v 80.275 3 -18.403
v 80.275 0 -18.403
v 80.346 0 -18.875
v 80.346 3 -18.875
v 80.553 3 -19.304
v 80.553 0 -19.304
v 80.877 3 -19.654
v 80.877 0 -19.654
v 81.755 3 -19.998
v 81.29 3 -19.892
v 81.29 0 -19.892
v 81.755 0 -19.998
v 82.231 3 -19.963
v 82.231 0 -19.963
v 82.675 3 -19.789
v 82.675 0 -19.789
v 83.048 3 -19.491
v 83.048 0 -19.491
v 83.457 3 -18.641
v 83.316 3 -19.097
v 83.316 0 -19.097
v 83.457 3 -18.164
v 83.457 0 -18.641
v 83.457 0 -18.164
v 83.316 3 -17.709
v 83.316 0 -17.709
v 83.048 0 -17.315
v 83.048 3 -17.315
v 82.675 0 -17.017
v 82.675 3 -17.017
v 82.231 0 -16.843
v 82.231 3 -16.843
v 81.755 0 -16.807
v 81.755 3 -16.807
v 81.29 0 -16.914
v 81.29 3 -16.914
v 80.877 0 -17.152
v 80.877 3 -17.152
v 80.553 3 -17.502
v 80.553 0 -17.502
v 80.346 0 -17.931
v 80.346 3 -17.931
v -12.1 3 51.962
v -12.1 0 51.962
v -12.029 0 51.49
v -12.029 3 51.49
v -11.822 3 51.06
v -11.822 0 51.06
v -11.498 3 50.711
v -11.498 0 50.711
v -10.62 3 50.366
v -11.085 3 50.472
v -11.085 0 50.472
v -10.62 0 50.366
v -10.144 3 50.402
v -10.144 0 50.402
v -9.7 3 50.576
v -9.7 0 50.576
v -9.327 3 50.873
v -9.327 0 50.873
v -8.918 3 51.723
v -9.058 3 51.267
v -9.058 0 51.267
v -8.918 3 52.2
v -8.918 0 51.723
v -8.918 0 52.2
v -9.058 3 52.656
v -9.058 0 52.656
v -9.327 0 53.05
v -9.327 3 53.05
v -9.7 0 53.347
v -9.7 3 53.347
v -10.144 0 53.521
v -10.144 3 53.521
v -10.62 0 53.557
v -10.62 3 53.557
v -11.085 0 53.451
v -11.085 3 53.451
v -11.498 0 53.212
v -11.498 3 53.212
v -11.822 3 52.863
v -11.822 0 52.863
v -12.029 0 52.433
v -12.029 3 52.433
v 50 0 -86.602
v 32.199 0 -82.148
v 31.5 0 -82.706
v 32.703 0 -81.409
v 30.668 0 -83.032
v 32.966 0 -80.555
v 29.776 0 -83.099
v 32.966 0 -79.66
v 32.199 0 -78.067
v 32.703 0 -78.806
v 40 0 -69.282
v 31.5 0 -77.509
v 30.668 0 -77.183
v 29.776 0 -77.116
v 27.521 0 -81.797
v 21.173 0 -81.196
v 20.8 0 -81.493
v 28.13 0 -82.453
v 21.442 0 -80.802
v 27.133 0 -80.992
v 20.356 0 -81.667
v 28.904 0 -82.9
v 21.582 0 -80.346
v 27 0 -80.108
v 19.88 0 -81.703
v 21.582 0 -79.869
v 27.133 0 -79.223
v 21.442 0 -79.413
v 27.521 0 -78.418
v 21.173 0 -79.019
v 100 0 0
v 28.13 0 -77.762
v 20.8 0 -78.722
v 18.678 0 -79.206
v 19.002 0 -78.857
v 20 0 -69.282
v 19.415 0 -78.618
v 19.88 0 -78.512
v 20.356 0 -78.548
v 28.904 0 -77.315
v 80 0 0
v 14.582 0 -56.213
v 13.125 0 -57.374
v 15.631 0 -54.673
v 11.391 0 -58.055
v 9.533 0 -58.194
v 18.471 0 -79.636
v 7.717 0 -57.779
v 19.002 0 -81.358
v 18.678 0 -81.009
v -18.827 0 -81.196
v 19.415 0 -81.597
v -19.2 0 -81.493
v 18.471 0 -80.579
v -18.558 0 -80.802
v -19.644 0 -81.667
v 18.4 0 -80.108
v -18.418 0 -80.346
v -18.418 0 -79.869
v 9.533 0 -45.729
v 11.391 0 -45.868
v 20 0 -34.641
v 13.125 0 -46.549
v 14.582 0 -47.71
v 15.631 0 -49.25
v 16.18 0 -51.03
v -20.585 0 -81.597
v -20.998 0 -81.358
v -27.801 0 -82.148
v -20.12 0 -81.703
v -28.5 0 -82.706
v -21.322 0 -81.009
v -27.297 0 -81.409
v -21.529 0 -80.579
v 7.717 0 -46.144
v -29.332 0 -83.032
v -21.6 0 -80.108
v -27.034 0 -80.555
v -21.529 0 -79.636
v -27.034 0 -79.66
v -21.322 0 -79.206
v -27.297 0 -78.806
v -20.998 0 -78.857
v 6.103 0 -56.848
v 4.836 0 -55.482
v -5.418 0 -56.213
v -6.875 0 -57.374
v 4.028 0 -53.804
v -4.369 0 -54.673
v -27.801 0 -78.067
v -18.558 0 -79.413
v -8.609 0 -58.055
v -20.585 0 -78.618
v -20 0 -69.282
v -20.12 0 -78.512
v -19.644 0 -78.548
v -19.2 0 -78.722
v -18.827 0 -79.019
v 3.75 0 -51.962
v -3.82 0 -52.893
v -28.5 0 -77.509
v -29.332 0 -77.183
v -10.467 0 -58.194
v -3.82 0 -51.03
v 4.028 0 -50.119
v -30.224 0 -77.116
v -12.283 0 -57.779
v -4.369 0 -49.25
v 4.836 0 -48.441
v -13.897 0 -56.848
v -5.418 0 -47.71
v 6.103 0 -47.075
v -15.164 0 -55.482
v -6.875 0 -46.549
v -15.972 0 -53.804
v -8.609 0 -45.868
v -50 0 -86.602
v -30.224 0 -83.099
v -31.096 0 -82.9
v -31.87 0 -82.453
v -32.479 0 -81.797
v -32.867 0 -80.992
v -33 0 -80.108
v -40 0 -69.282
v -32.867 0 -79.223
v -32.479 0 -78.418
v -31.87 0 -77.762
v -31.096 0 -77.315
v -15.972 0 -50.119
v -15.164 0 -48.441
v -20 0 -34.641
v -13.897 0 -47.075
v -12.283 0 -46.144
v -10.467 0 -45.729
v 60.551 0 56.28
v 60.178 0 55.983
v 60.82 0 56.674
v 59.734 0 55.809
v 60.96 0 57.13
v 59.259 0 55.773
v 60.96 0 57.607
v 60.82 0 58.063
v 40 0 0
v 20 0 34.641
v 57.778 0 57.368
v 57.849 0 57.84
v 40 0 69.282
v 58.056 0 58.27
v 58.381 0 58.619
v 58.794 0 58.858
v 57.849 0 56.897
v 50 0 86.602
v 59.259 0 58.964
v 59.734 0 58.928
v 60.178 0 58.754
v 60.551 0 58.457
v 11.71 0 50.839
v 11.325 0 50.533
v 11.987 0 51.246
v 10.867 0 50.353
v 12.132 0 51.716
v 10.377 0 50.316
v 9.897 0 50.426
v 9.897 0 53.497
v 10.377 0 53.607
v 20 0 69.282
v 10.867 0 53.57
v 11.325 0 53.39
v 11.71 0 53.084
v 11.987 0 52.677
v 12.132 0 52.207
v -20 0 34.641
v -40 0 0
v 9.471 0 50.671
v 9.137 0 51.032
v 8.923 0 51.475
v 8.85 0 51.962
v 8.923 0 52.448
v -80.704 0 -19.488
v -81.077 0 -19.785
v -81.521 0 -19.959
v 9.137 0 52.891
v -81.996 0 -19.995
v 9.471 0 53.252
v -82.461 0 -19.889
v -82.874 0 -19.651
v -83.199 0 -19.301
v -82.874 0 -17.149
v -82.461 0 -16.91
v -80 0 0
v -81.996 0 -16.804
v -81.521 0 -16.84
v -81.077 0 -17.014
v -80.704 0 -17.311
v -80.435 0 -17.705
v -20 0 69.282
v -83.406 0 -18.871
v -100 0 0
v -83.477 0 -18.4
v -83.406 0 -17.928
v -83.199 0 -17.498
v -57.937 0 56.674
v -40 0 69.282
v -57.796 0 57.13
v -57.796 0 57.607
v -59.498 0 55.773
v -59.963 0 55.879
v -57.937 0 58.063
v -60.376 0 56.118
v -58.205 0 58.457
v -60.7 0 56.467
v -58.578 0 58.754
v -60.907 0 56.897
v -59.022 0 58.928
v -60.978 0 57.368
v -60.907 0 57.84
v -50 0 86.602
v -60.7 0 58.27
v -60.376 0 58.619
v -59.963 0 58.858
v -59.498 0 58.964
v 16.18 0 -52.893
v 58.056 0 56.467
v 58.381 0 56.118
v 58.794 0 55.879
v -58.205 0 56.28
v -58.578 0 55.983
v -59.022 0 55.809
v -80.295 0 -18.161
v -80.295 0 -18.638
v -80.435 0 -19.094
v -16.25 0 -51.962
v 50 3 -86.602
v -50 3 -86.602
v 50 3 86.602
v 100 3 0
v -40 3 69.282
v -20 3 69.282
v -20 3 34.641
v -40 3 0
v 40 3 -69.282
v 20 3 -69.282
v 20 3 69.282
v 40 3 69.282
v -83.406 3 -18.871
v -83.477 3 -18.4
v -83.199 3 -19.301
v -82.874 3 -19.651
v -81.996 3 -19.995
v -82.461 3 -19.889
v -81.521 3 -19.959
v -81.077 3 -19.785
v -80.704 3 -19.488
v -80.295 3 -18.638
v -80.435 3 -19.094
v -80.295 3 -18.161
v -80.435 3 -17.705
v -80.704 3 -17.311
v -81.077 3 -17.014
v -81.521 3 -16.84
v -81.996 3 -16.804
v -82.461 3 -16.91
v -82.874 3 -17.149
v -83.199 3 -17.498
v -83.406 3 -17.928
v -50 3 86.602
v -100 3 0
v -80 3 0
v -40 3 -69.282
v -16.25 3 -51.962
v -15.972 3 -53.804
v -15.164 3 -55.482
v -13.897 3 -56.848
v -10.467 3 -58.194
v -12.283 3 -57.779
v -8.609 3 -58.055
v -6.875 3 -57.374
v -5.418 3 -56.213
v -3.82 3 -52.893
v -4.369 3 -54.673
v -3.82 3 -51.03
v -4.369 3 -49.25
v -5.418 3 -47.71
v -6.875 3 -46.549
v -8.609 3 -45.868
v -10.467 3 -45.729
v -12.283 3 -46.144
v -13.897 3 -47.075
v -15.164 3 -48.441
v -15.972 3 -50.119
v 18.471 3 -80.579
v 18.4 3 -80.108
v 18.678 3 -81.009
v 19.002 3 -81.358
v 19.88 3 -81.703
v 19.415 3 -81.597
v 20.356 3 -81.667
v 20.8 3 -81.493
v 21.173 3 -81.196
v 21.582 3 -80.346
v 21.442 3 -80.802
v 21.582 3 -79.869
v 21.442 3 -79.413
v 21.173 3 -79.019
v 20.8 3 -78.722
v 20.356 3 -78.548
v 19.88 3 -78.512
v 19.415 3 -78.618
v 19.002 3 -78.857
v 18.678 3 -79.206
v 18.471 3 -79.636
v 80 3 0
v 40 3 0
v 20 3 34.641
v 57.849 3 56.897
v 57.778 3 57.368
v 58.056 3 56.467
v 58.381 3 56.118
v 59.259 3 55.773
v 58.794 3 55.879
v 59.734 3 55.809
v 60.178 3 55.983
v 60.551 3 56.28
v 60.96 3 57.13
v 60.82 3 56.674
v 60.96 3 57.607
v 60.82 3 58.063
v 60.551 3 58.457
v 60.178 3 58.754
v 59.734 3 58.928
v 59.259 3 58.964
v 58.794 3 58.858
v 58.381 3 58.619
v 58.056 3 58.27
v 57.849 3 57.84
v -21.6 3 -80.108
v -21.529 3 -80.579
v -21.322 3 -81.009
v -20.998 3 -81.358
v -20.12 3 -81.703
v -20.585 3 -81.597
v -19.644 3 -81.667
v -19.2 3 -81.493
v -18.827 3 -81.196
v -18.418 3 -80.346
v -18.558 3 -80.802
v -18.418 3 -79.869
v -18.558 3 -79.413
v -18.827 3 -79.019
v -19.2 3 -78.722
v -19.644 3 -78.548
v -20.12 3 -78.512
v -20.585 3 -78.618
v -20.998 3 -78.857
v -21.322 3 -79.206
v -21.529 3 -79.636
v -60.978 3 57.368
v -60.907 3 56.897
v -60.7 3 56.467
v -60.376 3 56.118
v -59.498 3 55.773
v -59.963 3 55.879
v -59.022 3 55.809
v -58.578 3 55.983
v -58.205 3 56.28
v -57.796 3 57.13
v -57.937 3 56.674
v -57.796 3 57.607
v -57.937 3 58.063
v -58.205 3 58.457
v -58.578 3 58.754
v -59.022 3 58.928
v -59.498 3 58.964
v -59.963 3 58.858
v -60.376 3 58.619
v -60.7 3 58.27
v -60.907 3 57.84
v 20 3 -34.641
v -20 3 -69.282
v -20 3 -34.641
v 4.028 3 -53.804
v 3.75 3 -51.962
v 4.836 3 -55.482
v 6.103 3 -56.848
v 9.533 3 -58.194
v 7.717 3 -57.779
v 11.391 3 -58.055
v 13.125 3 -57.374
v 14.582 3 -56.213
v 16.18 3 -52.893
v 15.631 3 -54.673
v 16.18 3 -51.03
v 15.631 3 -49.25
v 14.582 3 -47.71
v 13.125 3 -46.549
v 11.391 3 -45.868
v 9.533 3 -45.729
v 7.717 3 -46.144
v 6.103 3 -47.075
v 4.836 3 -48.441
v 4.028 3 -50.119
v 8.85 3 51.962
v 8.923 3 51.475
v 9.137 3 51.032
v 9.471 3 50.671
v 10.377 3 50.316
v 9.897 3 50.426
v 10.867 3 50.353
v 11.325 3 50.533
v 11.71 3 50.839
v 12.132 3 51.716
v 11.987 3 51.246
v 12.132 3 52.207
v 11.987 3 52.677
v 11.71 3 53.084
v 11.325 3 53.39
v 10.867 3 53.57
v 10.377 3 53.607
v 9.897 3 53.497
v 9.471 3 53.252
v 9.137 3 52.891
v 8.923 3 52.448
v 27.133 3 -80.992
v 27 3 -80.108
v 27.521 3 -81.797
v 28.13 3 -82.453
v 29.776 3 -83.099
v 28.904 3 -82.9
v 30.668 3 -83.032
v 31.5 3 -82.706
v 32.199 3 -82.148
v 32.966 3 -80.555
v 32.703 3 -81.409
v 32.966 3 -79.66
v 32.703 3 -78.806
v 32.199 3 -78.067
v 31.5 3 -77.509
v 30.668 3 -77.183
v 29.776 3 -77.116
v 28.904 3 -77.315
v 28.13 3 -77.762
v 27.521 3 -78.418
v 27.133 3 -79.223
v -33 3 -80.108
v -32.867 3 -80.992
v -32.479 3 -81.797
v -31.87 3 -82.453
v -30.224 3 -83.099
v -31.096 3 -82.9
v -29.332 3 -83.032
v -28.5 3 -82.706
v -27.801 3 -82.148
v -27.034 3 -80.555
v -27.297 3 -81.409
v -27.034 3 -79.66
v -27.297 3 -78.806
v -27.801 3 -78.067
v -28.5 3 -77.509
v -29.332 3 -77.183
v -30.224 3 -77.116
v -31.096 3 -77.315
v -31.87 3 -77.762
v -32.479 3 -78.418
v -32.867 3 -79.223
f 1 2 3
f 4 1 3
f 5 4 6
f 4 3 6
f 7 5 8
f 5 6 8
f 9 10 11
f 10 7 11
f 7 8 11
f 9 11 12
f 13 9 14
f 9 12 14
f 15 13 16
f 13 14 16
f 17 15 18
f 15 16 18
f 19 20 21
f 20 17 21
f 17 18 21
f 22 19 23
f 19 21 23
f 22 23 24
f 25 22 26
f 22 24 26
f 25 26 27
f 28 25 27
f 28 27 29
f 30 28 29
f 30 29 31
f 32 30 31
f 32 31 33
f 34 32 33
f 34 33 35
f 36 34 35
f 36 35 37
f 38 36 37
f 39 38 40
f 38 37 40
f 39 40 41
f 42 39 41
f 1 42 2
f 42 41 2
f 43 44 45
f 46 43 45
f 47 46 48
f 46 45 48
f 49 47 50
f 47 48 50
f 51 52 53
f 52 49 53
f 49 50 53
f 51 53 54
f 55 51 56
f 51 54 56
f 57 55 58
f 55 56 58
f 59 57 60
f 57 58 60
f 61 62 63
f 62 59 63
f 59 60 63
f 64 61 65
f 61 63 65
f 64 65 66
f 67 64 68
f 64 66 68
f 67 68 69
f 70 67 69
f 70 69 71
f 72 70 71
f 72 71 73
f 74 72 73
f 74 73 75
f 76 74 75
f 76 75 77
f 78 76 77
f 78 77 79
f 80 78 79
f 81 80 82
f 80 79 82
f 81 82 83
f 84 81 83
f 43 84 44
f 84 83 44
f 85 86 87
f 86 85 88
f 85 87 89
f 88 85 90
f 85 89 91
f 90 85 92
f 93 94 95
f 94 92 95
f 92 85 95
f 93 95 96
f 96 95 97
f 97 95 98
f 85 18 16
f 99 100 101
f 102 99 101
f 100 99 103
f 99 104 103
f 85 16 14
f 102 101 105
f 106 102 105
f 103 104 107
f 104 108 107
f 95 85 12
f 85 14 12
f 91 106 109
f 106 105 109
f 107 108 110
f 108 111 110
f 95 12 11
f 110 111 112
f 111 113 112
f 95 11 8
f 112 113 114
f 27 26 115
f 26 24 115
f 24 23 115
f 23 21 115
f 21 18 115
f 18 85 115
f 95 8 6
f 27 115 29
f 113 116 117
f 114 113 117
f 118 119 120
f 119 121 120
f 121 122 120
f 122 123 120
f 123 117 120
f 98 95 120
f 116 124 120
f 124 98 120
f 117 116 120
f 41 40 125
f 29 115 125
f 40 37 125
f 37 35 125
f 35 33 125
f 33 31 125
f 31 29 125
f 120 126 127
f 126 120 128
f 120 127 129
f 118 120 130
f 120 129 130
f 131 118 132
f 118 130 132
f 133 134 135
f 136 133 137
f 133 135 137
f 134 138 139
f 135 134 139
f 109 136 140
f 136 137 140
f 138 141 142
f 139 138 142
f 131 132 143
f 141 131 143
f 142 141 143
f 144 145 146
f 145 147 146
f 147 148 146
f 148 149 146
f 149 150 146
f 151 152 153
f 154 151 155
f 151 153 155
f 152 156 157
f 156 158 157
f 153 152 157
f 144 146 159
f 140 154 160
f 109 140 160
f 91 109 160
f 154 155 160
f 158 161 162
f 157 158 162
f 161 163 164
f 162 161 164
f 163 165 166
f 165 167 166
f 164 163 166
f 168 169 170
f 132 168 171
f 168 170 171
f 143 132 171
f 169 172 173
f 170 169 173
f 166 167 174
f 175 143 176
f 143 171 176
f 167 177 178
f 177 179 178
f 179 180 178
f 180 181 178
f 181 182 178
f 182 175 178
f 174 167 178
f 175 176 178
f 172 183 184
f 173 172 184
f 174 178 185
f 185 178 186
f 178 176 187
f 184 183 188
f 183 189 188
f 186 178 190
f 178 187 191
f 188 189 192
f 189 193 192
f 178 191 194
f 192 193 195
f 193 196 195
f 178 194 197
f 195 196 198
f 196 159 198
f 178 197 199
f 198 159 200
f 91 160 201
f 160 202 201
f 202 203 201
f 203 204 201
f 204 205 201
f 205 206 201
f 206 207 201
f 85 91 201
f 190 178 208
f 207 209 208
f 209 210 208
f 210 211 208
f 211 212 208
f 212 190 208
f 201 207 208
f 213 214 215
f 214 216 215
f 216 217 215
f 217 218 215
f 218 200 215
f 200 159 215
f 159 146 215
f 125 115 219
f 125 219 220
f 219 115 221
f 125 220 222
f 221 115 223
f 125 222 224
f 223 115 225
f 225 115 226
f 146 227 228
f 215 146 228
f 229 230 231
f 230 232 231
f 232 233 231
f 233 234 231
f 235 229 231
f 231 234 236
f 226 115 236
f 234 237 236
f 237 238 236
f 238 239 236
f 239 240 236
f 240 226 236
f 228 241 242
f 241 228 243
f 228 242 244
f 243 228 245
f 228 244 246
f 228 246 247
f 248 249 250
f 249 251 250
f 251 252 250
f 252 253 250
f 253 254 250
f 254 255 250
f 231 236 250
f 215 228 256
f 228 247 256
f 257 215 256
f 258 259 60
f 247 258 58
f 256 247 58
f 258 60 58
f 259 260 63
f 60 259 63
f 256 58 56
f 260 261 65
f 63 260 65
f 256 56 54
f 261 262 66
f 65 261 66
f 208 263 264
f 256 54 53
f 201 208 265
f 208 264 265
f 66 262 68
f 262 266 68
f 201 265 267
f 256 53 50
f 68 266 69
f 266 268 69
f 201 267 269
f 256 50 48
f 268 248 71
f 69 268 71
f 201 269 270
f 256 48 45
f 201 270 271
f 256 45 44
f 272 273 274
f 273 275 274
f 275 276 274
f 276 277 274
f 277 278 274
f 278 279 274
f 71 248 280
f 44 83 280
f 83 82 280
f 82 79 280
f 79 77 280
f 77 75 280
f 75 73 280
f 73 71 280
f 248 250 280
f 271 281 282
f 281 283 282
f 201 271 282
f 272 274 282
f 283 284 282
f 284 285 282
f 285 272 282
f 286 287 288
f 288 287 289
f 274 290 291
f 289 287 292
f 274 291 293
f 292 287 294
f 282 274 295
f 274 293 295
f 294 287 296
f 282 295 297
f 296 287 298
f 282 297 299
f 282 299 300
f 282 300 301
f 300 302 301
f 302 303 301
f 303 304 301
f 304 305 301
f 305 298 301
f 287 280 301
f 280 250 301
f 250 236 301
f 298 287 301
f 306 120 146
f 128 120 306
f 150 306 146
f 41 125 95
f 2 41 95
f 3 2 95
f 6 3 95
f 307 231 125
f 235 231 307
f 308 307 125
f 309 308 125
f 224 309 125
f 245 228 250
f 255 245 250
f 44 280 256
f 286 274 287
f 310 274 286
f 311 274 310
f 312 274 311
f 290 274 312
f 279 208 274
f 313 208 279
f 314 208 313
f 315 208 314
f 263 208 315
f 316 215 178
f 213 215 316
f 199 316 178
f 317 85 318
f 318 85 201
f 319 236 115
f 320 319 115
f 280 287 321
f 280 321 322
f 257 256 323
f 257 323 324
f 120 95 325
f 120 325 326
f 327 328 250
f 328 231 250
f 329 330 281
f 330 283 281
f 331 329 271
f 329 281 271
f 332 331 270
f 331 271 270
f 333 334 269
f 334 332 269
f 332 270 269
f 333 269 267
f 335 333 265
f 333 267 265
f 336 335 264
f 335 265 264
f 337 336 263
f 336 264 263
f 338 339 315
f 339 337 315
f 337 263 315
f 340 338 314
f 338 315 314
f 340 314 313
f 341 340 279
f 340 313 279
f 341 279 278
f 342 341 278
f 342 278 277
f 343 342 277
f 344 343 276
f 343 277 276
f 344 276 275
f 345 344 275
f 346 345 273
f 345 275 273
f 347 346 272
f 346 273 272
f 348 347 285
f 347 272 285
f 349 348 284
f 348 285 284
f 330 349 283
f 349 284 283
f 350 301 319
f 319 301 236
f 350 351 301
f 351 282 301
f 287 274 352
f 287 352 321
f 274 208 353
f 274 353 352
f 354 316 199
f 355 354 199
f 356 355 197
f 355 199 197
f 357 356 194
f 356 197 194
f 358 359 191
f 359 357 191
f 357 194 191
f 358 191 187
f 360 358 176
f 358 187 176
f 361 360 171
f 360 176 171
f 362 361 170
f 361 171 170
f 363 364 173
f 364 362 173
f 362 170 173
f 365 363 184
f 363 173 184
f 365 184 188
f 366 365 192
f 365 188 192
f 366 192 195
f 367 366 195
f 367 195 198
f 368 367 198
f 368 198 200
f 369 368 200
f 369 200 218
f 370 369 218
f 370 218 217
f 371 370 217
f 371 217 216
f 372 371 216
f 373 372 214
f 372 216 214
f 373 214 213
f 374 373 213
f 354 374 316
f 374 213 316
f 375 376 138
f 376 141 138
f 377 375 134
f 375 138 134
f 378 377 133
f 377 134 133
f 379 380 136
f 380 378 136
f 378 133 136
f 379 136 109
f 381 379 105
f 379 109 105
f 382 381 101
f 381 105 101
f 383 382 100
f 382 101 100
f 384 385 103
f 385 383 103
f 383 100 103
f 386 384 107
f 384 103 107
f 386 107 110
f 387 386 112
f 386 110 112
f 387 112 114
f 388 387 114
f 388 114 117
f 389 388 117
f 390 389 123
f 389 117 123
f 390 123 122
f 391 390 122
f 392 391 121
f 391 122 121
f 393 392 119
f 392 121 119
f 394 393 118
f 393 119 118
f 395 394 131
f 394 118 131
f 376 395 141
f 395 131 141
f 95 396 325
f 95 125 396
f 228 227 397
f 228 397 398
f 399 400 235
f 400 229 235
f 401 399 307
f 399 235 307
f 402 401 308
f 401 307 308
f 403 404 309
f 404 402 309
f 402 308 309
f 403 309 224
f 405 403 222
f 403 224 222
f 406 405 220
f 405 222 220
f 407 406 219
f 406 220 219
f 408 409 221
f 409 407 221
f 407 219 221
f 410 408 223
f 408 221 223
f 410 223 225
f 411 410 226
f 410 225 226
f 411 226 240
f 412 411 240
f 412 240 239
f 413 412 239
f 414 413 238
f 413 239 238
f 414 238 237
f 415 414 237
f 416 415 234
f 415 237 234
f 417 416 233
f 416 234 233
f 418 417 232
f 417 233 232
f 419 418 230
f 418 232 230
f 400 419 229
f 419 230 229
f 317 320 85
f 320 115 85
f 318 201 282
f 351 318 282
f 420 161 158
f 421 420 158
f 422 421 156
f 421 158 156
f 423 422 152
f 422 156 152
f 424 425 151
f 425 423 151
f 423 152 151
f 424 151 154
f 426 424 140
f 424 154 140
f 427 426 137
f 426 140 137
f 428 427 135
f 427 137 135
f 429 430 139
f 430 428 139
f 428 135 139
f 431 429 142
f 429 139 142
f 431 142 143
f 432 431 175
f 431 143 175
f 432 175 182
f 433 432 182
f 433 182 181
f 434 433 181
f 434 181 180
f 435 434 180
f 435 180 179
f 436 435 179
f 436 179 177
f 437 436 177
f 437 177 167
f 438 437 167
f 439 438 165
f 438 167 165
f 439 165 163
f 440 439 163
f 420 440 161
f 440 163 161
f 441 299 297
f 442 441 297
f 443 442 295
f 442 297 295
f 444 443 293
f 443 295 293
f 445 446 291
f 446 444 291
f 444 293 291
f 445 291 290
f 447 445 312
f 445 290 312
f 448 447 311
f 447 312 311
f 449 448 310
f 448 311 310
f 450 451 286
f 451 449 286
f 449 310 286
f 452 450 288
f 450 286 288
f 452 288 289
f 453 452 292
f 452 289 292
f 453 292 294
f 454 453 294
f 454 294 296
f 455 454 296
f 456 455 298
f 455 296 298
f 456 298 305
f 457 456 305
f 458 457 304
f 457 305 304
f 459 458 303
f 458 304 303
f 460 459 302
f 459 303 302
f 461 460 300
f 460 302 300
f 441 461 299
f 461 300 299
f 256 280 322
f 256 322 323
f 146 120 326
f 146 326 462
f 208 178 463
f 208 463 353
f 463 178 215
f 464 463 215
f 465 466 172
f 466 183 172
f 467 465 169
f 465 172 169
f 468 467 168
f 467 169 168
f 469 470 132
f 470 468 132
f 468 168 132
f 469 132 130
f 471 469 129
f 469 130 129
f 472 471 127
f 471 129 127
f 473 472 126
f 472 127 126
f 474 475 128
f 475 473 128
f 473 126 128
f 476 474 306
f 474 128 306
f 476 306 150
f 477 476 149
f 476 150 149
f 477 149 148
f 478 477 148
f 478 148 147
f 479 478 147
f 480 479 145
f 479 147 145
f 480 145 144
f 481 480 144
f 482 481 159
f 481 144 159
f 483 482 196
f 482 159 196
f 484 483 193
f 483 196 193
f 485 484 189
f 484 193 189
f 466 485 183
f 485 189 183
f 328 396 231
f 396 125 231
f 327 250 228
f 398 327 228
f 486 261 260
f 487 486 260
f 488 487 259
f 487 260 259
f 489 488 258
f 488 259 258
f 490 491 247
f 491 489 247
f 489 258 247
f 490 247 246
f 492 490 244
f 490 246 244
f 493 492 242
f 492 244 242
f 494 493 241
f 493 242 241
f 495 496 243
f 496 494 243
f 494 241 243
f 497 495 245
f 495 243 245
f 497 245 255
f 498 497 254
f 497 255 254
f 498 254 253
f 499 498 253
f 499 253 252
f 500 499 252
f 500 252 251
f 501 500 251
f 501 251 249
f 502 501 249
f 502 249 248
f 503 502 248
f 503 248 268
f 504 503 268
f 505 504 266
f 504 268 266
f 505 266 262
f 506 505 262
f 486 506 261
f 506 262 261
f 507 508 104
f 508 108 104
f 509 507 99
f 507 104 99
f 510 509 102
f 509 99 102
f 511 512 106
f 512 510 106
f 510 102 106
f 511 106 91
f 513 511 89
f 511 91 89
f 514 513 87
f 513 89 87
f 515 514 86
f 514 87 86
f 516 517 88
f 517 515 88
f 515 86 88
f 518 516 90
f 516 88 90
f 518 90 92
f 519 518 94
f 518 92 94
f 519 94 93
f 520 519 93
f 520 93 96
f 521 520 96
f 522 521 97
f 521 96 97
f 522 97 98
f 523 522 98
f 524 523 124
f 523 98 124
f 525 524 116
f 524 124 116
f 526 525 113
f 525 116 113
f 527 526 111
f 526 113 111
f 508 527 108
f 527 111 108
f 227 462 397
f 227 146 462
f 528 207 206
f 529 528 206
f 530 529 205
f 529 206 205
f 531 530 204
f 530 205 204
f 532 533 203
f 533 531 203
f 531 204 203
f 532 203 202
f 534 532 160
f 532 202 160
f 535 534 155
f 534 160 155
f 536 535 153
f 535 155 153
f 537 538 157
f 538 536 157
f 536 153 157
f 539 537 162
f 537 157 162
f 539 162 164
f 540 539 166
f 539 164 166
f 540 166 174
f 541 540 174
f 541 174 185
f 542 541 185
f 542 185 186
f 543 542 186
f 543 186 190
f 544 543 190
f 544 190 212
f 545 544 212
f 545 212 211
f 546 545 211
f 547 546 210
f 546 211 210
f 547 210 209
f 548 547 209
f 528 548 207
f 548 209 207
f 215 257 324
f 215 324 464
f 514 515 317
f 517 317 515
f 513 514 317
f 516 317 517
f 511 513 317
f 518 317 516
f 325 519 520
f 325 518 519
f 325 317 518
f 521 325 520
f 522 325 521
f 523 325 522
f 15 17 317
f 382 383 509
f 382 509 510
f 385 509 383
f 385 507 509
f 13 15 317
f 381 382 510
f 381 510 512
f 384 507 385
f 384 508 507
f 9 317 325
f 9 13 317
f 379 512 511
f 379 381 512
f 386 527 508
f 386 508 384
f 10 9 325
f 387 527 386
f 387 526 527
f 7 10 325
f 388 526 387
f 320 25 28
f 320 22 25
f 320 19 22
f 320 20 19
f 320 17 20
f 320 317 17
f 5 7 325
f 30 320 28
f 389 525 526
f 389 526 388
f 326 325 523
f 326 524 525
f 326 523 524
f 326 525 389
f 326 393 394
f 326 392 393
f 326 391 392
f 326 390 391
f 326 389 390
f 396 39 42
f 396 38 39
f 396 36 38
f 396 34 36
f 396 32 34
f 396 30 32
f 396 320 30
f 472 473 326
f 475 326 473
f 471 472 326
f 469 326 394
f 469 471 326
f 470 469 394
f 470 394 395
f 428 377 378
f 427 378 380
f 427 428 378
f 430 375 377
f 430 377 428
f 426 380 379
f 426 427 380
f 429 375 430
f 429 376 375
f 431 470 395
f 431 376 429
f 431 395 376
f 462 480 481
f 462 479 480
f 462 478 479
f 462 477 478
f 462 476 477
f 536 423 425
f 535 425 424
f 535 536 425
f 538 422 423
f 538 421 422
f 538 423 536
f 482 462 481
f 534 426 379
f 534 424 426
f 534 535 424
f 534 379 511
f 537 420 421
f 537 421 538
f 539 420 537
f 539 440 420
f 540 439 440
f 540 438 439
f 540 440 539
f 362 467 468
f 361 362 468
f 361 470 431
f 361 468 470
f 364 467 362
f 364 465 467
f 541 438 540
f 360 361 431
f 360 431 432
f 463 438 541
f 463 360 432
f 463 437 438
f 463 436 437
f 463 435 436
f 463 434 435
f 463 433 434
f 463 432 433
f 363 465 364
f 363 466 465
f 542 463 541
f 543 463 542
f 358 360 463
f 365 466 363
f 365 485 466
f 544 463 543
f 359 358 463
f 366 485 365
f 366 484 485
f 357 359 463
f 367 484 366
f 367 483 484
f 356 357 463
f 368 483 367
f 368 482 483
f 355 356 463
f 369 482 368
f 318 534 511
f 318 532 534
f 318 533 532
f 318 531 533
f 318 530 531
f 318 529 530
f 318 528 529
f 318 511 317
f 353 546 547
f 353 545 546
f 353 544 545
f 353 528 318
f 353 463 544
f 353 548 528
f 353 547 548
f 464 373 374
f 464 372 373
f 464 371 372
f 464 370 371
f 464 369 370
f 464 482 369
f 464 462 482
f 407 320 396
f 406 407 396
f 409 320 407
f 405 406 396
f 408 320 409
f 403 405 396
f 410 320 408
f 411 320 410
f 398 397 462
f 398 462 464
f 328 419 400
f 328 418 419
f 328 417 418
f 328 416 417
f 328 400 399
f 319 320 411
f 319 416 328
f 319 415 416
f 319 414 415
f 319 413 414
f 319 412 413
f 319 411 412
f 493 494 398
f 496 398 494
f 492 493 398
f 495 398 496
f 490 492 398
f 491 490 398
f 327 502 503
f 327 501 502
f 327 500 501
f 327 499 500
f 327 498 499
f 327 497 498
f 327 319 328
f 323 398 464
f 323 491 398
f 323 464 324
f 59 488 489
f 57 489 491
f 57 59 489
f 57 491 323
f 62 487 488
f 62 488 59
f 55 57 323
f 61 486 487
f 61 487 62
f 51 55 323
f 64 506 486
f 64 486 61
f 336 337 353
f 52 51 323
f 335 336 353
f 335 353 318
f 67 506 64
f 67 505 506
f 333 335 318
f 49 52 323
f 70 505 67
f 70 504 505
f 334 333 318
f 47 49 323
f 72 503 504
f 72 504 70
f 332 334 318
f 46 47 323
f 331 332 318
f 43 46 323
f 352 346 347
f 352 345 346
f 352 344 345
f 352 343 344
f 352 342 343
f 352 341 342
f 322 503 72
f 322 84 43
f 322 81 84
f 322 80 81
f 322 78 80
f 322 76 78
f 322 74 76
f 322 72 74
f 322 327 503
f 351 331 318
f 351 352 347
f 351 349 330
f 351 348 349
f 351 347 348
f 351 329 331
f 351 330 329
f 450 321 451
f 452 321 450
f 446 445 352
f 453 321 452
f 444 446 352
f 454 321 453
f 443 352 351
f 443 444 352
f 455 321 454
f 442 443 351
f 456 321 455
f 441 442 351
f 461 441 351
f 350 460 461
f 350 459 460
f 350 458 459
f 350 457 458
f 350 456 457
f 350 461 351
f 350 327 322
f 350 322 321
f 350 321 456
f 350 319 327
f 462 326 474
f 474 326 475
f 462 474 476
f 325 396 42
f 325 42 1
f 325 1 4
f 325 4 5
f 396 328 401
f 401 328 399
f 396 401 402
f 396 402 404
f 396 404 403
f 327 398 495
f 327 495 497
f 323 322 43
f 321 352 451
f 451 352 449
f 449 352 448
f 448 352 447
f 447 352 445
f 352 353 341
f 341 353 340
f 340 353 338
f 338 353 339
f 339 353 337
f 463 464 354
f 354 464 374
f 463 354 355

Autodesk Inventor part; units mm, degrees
ref_plane "YZ Plane" through (0, 0, 0) normal (1, 0, 0) x (0, 1, 0)
ref_plane "XZ Plane" through (0, 0, 0) normal (0, 1, 0) x (-1, 0, 0)
ref_plane "XY Plane" through (0, 0, 0) normal (0, 0, 1) x (1, 0, 0)
sketch "Sketch1" plane through (0, 0, 0) normal (0, 1, 0) x (-1, 0, 0)
  line L0 (-50, 86.6025) -> (-100, 0)
  line L1 (-100, 0) -> (-50, -86.6025)
  line L2 (-50, -86.6025) -> (50, -86.6025)
  line L3 (50, -86.6025) -> (100, 0)
  line L4 (100, 0) -> (50, 86.6025)
  line L5 (50, 86.6025) -> (-50, 86.6025)
  circle A0 centre (20, -80.1075) radius 1.6
  circle A1 centre (-20, -80.1075) radius 1.6
  line L6 (-80, 0) -> (-40, 69.282)
  line L7 (-40, 69.282) -> (-20, 69.282)
  line L8 (-80, 0) -> (-40, -69.282)
  line L9 (-40, -69.282) -> (-20, -69.282)
  line L10 (20, -69.282) -> (40, -69.282)
  line L11 (40, -69.282) -> (80, 0)
  line L12 (80, 0) -> (40, 69.282)
  line L13 (40, 69.282) -> (20, 69.282)
  line L14 (-20, 69.282) -> (-20, 34.641)
  line L15 (20, 69.282) -> (20, 34.641)
  line L16 (20, -69.282) -> (20, -34.641)
  line L17 (-20, -69.282) -> (-20, -34.641)
  line L18 (-20, -34.641) -> (-40, 0)
  line L19 (-40, 0) -> (-20, 34.641)
  line L20 (20, 34.641) -> (40, 0)
  line L21 (40, 0) -> (20, -34.641)
  circle A2 centre (-10, -51.9615) radius 6.25
  circle A3 centre (10, -51.9615) radius 6.25
  circle A4 centre (-10.5, 51.9615) radius 1.65
  circle A5 centre (10.5, 51.9615) radius 1.6
  circle A6 centre (-59.3781, 57.3685) radius 1.6
  circle A7 centre (-81.8748, -18.4029) radius 1.6
  circle A8 centre (59.3781, 57.3685) radius 1.6
  circle A9 centre (81.8767, -18.3996) radius 1.6
  circle A10 centre (-30, -80.1075) radius 3
  circle A11 centre (30, -80.1075) radius 3
  dimension "d12" = 6
  dimension "d13" = 6
extrude "Extrusion1" add sketch "Sketch1" along normal blind 3
sketch "Sketch6" plane through (0, 3, 0) normal (0, 1, 0) x (1, 0, 0)
  line L0 (0, 0) -> (0, -34.641)
  line L1 (0, 0) -> (-40, 0)
  line L2 (17.5, -17.5) -> (-17.5, -17.5) construction
  line L3 (-17.5, -17.5) -> (-17.5, 17.5) construction
  line L4 (-17.5, 17.5) -> (17.5, 17.5) construction
  line L5 (17.5, 17.5) -> (17.5, -17.5) construction
  dimension "d58" = 35
  dimension "d70" = 17.5
  dimension "d72" = 17.5
decal "Decal1"
properties part number "Top Plate" material "Polycarbonate, Clear"
